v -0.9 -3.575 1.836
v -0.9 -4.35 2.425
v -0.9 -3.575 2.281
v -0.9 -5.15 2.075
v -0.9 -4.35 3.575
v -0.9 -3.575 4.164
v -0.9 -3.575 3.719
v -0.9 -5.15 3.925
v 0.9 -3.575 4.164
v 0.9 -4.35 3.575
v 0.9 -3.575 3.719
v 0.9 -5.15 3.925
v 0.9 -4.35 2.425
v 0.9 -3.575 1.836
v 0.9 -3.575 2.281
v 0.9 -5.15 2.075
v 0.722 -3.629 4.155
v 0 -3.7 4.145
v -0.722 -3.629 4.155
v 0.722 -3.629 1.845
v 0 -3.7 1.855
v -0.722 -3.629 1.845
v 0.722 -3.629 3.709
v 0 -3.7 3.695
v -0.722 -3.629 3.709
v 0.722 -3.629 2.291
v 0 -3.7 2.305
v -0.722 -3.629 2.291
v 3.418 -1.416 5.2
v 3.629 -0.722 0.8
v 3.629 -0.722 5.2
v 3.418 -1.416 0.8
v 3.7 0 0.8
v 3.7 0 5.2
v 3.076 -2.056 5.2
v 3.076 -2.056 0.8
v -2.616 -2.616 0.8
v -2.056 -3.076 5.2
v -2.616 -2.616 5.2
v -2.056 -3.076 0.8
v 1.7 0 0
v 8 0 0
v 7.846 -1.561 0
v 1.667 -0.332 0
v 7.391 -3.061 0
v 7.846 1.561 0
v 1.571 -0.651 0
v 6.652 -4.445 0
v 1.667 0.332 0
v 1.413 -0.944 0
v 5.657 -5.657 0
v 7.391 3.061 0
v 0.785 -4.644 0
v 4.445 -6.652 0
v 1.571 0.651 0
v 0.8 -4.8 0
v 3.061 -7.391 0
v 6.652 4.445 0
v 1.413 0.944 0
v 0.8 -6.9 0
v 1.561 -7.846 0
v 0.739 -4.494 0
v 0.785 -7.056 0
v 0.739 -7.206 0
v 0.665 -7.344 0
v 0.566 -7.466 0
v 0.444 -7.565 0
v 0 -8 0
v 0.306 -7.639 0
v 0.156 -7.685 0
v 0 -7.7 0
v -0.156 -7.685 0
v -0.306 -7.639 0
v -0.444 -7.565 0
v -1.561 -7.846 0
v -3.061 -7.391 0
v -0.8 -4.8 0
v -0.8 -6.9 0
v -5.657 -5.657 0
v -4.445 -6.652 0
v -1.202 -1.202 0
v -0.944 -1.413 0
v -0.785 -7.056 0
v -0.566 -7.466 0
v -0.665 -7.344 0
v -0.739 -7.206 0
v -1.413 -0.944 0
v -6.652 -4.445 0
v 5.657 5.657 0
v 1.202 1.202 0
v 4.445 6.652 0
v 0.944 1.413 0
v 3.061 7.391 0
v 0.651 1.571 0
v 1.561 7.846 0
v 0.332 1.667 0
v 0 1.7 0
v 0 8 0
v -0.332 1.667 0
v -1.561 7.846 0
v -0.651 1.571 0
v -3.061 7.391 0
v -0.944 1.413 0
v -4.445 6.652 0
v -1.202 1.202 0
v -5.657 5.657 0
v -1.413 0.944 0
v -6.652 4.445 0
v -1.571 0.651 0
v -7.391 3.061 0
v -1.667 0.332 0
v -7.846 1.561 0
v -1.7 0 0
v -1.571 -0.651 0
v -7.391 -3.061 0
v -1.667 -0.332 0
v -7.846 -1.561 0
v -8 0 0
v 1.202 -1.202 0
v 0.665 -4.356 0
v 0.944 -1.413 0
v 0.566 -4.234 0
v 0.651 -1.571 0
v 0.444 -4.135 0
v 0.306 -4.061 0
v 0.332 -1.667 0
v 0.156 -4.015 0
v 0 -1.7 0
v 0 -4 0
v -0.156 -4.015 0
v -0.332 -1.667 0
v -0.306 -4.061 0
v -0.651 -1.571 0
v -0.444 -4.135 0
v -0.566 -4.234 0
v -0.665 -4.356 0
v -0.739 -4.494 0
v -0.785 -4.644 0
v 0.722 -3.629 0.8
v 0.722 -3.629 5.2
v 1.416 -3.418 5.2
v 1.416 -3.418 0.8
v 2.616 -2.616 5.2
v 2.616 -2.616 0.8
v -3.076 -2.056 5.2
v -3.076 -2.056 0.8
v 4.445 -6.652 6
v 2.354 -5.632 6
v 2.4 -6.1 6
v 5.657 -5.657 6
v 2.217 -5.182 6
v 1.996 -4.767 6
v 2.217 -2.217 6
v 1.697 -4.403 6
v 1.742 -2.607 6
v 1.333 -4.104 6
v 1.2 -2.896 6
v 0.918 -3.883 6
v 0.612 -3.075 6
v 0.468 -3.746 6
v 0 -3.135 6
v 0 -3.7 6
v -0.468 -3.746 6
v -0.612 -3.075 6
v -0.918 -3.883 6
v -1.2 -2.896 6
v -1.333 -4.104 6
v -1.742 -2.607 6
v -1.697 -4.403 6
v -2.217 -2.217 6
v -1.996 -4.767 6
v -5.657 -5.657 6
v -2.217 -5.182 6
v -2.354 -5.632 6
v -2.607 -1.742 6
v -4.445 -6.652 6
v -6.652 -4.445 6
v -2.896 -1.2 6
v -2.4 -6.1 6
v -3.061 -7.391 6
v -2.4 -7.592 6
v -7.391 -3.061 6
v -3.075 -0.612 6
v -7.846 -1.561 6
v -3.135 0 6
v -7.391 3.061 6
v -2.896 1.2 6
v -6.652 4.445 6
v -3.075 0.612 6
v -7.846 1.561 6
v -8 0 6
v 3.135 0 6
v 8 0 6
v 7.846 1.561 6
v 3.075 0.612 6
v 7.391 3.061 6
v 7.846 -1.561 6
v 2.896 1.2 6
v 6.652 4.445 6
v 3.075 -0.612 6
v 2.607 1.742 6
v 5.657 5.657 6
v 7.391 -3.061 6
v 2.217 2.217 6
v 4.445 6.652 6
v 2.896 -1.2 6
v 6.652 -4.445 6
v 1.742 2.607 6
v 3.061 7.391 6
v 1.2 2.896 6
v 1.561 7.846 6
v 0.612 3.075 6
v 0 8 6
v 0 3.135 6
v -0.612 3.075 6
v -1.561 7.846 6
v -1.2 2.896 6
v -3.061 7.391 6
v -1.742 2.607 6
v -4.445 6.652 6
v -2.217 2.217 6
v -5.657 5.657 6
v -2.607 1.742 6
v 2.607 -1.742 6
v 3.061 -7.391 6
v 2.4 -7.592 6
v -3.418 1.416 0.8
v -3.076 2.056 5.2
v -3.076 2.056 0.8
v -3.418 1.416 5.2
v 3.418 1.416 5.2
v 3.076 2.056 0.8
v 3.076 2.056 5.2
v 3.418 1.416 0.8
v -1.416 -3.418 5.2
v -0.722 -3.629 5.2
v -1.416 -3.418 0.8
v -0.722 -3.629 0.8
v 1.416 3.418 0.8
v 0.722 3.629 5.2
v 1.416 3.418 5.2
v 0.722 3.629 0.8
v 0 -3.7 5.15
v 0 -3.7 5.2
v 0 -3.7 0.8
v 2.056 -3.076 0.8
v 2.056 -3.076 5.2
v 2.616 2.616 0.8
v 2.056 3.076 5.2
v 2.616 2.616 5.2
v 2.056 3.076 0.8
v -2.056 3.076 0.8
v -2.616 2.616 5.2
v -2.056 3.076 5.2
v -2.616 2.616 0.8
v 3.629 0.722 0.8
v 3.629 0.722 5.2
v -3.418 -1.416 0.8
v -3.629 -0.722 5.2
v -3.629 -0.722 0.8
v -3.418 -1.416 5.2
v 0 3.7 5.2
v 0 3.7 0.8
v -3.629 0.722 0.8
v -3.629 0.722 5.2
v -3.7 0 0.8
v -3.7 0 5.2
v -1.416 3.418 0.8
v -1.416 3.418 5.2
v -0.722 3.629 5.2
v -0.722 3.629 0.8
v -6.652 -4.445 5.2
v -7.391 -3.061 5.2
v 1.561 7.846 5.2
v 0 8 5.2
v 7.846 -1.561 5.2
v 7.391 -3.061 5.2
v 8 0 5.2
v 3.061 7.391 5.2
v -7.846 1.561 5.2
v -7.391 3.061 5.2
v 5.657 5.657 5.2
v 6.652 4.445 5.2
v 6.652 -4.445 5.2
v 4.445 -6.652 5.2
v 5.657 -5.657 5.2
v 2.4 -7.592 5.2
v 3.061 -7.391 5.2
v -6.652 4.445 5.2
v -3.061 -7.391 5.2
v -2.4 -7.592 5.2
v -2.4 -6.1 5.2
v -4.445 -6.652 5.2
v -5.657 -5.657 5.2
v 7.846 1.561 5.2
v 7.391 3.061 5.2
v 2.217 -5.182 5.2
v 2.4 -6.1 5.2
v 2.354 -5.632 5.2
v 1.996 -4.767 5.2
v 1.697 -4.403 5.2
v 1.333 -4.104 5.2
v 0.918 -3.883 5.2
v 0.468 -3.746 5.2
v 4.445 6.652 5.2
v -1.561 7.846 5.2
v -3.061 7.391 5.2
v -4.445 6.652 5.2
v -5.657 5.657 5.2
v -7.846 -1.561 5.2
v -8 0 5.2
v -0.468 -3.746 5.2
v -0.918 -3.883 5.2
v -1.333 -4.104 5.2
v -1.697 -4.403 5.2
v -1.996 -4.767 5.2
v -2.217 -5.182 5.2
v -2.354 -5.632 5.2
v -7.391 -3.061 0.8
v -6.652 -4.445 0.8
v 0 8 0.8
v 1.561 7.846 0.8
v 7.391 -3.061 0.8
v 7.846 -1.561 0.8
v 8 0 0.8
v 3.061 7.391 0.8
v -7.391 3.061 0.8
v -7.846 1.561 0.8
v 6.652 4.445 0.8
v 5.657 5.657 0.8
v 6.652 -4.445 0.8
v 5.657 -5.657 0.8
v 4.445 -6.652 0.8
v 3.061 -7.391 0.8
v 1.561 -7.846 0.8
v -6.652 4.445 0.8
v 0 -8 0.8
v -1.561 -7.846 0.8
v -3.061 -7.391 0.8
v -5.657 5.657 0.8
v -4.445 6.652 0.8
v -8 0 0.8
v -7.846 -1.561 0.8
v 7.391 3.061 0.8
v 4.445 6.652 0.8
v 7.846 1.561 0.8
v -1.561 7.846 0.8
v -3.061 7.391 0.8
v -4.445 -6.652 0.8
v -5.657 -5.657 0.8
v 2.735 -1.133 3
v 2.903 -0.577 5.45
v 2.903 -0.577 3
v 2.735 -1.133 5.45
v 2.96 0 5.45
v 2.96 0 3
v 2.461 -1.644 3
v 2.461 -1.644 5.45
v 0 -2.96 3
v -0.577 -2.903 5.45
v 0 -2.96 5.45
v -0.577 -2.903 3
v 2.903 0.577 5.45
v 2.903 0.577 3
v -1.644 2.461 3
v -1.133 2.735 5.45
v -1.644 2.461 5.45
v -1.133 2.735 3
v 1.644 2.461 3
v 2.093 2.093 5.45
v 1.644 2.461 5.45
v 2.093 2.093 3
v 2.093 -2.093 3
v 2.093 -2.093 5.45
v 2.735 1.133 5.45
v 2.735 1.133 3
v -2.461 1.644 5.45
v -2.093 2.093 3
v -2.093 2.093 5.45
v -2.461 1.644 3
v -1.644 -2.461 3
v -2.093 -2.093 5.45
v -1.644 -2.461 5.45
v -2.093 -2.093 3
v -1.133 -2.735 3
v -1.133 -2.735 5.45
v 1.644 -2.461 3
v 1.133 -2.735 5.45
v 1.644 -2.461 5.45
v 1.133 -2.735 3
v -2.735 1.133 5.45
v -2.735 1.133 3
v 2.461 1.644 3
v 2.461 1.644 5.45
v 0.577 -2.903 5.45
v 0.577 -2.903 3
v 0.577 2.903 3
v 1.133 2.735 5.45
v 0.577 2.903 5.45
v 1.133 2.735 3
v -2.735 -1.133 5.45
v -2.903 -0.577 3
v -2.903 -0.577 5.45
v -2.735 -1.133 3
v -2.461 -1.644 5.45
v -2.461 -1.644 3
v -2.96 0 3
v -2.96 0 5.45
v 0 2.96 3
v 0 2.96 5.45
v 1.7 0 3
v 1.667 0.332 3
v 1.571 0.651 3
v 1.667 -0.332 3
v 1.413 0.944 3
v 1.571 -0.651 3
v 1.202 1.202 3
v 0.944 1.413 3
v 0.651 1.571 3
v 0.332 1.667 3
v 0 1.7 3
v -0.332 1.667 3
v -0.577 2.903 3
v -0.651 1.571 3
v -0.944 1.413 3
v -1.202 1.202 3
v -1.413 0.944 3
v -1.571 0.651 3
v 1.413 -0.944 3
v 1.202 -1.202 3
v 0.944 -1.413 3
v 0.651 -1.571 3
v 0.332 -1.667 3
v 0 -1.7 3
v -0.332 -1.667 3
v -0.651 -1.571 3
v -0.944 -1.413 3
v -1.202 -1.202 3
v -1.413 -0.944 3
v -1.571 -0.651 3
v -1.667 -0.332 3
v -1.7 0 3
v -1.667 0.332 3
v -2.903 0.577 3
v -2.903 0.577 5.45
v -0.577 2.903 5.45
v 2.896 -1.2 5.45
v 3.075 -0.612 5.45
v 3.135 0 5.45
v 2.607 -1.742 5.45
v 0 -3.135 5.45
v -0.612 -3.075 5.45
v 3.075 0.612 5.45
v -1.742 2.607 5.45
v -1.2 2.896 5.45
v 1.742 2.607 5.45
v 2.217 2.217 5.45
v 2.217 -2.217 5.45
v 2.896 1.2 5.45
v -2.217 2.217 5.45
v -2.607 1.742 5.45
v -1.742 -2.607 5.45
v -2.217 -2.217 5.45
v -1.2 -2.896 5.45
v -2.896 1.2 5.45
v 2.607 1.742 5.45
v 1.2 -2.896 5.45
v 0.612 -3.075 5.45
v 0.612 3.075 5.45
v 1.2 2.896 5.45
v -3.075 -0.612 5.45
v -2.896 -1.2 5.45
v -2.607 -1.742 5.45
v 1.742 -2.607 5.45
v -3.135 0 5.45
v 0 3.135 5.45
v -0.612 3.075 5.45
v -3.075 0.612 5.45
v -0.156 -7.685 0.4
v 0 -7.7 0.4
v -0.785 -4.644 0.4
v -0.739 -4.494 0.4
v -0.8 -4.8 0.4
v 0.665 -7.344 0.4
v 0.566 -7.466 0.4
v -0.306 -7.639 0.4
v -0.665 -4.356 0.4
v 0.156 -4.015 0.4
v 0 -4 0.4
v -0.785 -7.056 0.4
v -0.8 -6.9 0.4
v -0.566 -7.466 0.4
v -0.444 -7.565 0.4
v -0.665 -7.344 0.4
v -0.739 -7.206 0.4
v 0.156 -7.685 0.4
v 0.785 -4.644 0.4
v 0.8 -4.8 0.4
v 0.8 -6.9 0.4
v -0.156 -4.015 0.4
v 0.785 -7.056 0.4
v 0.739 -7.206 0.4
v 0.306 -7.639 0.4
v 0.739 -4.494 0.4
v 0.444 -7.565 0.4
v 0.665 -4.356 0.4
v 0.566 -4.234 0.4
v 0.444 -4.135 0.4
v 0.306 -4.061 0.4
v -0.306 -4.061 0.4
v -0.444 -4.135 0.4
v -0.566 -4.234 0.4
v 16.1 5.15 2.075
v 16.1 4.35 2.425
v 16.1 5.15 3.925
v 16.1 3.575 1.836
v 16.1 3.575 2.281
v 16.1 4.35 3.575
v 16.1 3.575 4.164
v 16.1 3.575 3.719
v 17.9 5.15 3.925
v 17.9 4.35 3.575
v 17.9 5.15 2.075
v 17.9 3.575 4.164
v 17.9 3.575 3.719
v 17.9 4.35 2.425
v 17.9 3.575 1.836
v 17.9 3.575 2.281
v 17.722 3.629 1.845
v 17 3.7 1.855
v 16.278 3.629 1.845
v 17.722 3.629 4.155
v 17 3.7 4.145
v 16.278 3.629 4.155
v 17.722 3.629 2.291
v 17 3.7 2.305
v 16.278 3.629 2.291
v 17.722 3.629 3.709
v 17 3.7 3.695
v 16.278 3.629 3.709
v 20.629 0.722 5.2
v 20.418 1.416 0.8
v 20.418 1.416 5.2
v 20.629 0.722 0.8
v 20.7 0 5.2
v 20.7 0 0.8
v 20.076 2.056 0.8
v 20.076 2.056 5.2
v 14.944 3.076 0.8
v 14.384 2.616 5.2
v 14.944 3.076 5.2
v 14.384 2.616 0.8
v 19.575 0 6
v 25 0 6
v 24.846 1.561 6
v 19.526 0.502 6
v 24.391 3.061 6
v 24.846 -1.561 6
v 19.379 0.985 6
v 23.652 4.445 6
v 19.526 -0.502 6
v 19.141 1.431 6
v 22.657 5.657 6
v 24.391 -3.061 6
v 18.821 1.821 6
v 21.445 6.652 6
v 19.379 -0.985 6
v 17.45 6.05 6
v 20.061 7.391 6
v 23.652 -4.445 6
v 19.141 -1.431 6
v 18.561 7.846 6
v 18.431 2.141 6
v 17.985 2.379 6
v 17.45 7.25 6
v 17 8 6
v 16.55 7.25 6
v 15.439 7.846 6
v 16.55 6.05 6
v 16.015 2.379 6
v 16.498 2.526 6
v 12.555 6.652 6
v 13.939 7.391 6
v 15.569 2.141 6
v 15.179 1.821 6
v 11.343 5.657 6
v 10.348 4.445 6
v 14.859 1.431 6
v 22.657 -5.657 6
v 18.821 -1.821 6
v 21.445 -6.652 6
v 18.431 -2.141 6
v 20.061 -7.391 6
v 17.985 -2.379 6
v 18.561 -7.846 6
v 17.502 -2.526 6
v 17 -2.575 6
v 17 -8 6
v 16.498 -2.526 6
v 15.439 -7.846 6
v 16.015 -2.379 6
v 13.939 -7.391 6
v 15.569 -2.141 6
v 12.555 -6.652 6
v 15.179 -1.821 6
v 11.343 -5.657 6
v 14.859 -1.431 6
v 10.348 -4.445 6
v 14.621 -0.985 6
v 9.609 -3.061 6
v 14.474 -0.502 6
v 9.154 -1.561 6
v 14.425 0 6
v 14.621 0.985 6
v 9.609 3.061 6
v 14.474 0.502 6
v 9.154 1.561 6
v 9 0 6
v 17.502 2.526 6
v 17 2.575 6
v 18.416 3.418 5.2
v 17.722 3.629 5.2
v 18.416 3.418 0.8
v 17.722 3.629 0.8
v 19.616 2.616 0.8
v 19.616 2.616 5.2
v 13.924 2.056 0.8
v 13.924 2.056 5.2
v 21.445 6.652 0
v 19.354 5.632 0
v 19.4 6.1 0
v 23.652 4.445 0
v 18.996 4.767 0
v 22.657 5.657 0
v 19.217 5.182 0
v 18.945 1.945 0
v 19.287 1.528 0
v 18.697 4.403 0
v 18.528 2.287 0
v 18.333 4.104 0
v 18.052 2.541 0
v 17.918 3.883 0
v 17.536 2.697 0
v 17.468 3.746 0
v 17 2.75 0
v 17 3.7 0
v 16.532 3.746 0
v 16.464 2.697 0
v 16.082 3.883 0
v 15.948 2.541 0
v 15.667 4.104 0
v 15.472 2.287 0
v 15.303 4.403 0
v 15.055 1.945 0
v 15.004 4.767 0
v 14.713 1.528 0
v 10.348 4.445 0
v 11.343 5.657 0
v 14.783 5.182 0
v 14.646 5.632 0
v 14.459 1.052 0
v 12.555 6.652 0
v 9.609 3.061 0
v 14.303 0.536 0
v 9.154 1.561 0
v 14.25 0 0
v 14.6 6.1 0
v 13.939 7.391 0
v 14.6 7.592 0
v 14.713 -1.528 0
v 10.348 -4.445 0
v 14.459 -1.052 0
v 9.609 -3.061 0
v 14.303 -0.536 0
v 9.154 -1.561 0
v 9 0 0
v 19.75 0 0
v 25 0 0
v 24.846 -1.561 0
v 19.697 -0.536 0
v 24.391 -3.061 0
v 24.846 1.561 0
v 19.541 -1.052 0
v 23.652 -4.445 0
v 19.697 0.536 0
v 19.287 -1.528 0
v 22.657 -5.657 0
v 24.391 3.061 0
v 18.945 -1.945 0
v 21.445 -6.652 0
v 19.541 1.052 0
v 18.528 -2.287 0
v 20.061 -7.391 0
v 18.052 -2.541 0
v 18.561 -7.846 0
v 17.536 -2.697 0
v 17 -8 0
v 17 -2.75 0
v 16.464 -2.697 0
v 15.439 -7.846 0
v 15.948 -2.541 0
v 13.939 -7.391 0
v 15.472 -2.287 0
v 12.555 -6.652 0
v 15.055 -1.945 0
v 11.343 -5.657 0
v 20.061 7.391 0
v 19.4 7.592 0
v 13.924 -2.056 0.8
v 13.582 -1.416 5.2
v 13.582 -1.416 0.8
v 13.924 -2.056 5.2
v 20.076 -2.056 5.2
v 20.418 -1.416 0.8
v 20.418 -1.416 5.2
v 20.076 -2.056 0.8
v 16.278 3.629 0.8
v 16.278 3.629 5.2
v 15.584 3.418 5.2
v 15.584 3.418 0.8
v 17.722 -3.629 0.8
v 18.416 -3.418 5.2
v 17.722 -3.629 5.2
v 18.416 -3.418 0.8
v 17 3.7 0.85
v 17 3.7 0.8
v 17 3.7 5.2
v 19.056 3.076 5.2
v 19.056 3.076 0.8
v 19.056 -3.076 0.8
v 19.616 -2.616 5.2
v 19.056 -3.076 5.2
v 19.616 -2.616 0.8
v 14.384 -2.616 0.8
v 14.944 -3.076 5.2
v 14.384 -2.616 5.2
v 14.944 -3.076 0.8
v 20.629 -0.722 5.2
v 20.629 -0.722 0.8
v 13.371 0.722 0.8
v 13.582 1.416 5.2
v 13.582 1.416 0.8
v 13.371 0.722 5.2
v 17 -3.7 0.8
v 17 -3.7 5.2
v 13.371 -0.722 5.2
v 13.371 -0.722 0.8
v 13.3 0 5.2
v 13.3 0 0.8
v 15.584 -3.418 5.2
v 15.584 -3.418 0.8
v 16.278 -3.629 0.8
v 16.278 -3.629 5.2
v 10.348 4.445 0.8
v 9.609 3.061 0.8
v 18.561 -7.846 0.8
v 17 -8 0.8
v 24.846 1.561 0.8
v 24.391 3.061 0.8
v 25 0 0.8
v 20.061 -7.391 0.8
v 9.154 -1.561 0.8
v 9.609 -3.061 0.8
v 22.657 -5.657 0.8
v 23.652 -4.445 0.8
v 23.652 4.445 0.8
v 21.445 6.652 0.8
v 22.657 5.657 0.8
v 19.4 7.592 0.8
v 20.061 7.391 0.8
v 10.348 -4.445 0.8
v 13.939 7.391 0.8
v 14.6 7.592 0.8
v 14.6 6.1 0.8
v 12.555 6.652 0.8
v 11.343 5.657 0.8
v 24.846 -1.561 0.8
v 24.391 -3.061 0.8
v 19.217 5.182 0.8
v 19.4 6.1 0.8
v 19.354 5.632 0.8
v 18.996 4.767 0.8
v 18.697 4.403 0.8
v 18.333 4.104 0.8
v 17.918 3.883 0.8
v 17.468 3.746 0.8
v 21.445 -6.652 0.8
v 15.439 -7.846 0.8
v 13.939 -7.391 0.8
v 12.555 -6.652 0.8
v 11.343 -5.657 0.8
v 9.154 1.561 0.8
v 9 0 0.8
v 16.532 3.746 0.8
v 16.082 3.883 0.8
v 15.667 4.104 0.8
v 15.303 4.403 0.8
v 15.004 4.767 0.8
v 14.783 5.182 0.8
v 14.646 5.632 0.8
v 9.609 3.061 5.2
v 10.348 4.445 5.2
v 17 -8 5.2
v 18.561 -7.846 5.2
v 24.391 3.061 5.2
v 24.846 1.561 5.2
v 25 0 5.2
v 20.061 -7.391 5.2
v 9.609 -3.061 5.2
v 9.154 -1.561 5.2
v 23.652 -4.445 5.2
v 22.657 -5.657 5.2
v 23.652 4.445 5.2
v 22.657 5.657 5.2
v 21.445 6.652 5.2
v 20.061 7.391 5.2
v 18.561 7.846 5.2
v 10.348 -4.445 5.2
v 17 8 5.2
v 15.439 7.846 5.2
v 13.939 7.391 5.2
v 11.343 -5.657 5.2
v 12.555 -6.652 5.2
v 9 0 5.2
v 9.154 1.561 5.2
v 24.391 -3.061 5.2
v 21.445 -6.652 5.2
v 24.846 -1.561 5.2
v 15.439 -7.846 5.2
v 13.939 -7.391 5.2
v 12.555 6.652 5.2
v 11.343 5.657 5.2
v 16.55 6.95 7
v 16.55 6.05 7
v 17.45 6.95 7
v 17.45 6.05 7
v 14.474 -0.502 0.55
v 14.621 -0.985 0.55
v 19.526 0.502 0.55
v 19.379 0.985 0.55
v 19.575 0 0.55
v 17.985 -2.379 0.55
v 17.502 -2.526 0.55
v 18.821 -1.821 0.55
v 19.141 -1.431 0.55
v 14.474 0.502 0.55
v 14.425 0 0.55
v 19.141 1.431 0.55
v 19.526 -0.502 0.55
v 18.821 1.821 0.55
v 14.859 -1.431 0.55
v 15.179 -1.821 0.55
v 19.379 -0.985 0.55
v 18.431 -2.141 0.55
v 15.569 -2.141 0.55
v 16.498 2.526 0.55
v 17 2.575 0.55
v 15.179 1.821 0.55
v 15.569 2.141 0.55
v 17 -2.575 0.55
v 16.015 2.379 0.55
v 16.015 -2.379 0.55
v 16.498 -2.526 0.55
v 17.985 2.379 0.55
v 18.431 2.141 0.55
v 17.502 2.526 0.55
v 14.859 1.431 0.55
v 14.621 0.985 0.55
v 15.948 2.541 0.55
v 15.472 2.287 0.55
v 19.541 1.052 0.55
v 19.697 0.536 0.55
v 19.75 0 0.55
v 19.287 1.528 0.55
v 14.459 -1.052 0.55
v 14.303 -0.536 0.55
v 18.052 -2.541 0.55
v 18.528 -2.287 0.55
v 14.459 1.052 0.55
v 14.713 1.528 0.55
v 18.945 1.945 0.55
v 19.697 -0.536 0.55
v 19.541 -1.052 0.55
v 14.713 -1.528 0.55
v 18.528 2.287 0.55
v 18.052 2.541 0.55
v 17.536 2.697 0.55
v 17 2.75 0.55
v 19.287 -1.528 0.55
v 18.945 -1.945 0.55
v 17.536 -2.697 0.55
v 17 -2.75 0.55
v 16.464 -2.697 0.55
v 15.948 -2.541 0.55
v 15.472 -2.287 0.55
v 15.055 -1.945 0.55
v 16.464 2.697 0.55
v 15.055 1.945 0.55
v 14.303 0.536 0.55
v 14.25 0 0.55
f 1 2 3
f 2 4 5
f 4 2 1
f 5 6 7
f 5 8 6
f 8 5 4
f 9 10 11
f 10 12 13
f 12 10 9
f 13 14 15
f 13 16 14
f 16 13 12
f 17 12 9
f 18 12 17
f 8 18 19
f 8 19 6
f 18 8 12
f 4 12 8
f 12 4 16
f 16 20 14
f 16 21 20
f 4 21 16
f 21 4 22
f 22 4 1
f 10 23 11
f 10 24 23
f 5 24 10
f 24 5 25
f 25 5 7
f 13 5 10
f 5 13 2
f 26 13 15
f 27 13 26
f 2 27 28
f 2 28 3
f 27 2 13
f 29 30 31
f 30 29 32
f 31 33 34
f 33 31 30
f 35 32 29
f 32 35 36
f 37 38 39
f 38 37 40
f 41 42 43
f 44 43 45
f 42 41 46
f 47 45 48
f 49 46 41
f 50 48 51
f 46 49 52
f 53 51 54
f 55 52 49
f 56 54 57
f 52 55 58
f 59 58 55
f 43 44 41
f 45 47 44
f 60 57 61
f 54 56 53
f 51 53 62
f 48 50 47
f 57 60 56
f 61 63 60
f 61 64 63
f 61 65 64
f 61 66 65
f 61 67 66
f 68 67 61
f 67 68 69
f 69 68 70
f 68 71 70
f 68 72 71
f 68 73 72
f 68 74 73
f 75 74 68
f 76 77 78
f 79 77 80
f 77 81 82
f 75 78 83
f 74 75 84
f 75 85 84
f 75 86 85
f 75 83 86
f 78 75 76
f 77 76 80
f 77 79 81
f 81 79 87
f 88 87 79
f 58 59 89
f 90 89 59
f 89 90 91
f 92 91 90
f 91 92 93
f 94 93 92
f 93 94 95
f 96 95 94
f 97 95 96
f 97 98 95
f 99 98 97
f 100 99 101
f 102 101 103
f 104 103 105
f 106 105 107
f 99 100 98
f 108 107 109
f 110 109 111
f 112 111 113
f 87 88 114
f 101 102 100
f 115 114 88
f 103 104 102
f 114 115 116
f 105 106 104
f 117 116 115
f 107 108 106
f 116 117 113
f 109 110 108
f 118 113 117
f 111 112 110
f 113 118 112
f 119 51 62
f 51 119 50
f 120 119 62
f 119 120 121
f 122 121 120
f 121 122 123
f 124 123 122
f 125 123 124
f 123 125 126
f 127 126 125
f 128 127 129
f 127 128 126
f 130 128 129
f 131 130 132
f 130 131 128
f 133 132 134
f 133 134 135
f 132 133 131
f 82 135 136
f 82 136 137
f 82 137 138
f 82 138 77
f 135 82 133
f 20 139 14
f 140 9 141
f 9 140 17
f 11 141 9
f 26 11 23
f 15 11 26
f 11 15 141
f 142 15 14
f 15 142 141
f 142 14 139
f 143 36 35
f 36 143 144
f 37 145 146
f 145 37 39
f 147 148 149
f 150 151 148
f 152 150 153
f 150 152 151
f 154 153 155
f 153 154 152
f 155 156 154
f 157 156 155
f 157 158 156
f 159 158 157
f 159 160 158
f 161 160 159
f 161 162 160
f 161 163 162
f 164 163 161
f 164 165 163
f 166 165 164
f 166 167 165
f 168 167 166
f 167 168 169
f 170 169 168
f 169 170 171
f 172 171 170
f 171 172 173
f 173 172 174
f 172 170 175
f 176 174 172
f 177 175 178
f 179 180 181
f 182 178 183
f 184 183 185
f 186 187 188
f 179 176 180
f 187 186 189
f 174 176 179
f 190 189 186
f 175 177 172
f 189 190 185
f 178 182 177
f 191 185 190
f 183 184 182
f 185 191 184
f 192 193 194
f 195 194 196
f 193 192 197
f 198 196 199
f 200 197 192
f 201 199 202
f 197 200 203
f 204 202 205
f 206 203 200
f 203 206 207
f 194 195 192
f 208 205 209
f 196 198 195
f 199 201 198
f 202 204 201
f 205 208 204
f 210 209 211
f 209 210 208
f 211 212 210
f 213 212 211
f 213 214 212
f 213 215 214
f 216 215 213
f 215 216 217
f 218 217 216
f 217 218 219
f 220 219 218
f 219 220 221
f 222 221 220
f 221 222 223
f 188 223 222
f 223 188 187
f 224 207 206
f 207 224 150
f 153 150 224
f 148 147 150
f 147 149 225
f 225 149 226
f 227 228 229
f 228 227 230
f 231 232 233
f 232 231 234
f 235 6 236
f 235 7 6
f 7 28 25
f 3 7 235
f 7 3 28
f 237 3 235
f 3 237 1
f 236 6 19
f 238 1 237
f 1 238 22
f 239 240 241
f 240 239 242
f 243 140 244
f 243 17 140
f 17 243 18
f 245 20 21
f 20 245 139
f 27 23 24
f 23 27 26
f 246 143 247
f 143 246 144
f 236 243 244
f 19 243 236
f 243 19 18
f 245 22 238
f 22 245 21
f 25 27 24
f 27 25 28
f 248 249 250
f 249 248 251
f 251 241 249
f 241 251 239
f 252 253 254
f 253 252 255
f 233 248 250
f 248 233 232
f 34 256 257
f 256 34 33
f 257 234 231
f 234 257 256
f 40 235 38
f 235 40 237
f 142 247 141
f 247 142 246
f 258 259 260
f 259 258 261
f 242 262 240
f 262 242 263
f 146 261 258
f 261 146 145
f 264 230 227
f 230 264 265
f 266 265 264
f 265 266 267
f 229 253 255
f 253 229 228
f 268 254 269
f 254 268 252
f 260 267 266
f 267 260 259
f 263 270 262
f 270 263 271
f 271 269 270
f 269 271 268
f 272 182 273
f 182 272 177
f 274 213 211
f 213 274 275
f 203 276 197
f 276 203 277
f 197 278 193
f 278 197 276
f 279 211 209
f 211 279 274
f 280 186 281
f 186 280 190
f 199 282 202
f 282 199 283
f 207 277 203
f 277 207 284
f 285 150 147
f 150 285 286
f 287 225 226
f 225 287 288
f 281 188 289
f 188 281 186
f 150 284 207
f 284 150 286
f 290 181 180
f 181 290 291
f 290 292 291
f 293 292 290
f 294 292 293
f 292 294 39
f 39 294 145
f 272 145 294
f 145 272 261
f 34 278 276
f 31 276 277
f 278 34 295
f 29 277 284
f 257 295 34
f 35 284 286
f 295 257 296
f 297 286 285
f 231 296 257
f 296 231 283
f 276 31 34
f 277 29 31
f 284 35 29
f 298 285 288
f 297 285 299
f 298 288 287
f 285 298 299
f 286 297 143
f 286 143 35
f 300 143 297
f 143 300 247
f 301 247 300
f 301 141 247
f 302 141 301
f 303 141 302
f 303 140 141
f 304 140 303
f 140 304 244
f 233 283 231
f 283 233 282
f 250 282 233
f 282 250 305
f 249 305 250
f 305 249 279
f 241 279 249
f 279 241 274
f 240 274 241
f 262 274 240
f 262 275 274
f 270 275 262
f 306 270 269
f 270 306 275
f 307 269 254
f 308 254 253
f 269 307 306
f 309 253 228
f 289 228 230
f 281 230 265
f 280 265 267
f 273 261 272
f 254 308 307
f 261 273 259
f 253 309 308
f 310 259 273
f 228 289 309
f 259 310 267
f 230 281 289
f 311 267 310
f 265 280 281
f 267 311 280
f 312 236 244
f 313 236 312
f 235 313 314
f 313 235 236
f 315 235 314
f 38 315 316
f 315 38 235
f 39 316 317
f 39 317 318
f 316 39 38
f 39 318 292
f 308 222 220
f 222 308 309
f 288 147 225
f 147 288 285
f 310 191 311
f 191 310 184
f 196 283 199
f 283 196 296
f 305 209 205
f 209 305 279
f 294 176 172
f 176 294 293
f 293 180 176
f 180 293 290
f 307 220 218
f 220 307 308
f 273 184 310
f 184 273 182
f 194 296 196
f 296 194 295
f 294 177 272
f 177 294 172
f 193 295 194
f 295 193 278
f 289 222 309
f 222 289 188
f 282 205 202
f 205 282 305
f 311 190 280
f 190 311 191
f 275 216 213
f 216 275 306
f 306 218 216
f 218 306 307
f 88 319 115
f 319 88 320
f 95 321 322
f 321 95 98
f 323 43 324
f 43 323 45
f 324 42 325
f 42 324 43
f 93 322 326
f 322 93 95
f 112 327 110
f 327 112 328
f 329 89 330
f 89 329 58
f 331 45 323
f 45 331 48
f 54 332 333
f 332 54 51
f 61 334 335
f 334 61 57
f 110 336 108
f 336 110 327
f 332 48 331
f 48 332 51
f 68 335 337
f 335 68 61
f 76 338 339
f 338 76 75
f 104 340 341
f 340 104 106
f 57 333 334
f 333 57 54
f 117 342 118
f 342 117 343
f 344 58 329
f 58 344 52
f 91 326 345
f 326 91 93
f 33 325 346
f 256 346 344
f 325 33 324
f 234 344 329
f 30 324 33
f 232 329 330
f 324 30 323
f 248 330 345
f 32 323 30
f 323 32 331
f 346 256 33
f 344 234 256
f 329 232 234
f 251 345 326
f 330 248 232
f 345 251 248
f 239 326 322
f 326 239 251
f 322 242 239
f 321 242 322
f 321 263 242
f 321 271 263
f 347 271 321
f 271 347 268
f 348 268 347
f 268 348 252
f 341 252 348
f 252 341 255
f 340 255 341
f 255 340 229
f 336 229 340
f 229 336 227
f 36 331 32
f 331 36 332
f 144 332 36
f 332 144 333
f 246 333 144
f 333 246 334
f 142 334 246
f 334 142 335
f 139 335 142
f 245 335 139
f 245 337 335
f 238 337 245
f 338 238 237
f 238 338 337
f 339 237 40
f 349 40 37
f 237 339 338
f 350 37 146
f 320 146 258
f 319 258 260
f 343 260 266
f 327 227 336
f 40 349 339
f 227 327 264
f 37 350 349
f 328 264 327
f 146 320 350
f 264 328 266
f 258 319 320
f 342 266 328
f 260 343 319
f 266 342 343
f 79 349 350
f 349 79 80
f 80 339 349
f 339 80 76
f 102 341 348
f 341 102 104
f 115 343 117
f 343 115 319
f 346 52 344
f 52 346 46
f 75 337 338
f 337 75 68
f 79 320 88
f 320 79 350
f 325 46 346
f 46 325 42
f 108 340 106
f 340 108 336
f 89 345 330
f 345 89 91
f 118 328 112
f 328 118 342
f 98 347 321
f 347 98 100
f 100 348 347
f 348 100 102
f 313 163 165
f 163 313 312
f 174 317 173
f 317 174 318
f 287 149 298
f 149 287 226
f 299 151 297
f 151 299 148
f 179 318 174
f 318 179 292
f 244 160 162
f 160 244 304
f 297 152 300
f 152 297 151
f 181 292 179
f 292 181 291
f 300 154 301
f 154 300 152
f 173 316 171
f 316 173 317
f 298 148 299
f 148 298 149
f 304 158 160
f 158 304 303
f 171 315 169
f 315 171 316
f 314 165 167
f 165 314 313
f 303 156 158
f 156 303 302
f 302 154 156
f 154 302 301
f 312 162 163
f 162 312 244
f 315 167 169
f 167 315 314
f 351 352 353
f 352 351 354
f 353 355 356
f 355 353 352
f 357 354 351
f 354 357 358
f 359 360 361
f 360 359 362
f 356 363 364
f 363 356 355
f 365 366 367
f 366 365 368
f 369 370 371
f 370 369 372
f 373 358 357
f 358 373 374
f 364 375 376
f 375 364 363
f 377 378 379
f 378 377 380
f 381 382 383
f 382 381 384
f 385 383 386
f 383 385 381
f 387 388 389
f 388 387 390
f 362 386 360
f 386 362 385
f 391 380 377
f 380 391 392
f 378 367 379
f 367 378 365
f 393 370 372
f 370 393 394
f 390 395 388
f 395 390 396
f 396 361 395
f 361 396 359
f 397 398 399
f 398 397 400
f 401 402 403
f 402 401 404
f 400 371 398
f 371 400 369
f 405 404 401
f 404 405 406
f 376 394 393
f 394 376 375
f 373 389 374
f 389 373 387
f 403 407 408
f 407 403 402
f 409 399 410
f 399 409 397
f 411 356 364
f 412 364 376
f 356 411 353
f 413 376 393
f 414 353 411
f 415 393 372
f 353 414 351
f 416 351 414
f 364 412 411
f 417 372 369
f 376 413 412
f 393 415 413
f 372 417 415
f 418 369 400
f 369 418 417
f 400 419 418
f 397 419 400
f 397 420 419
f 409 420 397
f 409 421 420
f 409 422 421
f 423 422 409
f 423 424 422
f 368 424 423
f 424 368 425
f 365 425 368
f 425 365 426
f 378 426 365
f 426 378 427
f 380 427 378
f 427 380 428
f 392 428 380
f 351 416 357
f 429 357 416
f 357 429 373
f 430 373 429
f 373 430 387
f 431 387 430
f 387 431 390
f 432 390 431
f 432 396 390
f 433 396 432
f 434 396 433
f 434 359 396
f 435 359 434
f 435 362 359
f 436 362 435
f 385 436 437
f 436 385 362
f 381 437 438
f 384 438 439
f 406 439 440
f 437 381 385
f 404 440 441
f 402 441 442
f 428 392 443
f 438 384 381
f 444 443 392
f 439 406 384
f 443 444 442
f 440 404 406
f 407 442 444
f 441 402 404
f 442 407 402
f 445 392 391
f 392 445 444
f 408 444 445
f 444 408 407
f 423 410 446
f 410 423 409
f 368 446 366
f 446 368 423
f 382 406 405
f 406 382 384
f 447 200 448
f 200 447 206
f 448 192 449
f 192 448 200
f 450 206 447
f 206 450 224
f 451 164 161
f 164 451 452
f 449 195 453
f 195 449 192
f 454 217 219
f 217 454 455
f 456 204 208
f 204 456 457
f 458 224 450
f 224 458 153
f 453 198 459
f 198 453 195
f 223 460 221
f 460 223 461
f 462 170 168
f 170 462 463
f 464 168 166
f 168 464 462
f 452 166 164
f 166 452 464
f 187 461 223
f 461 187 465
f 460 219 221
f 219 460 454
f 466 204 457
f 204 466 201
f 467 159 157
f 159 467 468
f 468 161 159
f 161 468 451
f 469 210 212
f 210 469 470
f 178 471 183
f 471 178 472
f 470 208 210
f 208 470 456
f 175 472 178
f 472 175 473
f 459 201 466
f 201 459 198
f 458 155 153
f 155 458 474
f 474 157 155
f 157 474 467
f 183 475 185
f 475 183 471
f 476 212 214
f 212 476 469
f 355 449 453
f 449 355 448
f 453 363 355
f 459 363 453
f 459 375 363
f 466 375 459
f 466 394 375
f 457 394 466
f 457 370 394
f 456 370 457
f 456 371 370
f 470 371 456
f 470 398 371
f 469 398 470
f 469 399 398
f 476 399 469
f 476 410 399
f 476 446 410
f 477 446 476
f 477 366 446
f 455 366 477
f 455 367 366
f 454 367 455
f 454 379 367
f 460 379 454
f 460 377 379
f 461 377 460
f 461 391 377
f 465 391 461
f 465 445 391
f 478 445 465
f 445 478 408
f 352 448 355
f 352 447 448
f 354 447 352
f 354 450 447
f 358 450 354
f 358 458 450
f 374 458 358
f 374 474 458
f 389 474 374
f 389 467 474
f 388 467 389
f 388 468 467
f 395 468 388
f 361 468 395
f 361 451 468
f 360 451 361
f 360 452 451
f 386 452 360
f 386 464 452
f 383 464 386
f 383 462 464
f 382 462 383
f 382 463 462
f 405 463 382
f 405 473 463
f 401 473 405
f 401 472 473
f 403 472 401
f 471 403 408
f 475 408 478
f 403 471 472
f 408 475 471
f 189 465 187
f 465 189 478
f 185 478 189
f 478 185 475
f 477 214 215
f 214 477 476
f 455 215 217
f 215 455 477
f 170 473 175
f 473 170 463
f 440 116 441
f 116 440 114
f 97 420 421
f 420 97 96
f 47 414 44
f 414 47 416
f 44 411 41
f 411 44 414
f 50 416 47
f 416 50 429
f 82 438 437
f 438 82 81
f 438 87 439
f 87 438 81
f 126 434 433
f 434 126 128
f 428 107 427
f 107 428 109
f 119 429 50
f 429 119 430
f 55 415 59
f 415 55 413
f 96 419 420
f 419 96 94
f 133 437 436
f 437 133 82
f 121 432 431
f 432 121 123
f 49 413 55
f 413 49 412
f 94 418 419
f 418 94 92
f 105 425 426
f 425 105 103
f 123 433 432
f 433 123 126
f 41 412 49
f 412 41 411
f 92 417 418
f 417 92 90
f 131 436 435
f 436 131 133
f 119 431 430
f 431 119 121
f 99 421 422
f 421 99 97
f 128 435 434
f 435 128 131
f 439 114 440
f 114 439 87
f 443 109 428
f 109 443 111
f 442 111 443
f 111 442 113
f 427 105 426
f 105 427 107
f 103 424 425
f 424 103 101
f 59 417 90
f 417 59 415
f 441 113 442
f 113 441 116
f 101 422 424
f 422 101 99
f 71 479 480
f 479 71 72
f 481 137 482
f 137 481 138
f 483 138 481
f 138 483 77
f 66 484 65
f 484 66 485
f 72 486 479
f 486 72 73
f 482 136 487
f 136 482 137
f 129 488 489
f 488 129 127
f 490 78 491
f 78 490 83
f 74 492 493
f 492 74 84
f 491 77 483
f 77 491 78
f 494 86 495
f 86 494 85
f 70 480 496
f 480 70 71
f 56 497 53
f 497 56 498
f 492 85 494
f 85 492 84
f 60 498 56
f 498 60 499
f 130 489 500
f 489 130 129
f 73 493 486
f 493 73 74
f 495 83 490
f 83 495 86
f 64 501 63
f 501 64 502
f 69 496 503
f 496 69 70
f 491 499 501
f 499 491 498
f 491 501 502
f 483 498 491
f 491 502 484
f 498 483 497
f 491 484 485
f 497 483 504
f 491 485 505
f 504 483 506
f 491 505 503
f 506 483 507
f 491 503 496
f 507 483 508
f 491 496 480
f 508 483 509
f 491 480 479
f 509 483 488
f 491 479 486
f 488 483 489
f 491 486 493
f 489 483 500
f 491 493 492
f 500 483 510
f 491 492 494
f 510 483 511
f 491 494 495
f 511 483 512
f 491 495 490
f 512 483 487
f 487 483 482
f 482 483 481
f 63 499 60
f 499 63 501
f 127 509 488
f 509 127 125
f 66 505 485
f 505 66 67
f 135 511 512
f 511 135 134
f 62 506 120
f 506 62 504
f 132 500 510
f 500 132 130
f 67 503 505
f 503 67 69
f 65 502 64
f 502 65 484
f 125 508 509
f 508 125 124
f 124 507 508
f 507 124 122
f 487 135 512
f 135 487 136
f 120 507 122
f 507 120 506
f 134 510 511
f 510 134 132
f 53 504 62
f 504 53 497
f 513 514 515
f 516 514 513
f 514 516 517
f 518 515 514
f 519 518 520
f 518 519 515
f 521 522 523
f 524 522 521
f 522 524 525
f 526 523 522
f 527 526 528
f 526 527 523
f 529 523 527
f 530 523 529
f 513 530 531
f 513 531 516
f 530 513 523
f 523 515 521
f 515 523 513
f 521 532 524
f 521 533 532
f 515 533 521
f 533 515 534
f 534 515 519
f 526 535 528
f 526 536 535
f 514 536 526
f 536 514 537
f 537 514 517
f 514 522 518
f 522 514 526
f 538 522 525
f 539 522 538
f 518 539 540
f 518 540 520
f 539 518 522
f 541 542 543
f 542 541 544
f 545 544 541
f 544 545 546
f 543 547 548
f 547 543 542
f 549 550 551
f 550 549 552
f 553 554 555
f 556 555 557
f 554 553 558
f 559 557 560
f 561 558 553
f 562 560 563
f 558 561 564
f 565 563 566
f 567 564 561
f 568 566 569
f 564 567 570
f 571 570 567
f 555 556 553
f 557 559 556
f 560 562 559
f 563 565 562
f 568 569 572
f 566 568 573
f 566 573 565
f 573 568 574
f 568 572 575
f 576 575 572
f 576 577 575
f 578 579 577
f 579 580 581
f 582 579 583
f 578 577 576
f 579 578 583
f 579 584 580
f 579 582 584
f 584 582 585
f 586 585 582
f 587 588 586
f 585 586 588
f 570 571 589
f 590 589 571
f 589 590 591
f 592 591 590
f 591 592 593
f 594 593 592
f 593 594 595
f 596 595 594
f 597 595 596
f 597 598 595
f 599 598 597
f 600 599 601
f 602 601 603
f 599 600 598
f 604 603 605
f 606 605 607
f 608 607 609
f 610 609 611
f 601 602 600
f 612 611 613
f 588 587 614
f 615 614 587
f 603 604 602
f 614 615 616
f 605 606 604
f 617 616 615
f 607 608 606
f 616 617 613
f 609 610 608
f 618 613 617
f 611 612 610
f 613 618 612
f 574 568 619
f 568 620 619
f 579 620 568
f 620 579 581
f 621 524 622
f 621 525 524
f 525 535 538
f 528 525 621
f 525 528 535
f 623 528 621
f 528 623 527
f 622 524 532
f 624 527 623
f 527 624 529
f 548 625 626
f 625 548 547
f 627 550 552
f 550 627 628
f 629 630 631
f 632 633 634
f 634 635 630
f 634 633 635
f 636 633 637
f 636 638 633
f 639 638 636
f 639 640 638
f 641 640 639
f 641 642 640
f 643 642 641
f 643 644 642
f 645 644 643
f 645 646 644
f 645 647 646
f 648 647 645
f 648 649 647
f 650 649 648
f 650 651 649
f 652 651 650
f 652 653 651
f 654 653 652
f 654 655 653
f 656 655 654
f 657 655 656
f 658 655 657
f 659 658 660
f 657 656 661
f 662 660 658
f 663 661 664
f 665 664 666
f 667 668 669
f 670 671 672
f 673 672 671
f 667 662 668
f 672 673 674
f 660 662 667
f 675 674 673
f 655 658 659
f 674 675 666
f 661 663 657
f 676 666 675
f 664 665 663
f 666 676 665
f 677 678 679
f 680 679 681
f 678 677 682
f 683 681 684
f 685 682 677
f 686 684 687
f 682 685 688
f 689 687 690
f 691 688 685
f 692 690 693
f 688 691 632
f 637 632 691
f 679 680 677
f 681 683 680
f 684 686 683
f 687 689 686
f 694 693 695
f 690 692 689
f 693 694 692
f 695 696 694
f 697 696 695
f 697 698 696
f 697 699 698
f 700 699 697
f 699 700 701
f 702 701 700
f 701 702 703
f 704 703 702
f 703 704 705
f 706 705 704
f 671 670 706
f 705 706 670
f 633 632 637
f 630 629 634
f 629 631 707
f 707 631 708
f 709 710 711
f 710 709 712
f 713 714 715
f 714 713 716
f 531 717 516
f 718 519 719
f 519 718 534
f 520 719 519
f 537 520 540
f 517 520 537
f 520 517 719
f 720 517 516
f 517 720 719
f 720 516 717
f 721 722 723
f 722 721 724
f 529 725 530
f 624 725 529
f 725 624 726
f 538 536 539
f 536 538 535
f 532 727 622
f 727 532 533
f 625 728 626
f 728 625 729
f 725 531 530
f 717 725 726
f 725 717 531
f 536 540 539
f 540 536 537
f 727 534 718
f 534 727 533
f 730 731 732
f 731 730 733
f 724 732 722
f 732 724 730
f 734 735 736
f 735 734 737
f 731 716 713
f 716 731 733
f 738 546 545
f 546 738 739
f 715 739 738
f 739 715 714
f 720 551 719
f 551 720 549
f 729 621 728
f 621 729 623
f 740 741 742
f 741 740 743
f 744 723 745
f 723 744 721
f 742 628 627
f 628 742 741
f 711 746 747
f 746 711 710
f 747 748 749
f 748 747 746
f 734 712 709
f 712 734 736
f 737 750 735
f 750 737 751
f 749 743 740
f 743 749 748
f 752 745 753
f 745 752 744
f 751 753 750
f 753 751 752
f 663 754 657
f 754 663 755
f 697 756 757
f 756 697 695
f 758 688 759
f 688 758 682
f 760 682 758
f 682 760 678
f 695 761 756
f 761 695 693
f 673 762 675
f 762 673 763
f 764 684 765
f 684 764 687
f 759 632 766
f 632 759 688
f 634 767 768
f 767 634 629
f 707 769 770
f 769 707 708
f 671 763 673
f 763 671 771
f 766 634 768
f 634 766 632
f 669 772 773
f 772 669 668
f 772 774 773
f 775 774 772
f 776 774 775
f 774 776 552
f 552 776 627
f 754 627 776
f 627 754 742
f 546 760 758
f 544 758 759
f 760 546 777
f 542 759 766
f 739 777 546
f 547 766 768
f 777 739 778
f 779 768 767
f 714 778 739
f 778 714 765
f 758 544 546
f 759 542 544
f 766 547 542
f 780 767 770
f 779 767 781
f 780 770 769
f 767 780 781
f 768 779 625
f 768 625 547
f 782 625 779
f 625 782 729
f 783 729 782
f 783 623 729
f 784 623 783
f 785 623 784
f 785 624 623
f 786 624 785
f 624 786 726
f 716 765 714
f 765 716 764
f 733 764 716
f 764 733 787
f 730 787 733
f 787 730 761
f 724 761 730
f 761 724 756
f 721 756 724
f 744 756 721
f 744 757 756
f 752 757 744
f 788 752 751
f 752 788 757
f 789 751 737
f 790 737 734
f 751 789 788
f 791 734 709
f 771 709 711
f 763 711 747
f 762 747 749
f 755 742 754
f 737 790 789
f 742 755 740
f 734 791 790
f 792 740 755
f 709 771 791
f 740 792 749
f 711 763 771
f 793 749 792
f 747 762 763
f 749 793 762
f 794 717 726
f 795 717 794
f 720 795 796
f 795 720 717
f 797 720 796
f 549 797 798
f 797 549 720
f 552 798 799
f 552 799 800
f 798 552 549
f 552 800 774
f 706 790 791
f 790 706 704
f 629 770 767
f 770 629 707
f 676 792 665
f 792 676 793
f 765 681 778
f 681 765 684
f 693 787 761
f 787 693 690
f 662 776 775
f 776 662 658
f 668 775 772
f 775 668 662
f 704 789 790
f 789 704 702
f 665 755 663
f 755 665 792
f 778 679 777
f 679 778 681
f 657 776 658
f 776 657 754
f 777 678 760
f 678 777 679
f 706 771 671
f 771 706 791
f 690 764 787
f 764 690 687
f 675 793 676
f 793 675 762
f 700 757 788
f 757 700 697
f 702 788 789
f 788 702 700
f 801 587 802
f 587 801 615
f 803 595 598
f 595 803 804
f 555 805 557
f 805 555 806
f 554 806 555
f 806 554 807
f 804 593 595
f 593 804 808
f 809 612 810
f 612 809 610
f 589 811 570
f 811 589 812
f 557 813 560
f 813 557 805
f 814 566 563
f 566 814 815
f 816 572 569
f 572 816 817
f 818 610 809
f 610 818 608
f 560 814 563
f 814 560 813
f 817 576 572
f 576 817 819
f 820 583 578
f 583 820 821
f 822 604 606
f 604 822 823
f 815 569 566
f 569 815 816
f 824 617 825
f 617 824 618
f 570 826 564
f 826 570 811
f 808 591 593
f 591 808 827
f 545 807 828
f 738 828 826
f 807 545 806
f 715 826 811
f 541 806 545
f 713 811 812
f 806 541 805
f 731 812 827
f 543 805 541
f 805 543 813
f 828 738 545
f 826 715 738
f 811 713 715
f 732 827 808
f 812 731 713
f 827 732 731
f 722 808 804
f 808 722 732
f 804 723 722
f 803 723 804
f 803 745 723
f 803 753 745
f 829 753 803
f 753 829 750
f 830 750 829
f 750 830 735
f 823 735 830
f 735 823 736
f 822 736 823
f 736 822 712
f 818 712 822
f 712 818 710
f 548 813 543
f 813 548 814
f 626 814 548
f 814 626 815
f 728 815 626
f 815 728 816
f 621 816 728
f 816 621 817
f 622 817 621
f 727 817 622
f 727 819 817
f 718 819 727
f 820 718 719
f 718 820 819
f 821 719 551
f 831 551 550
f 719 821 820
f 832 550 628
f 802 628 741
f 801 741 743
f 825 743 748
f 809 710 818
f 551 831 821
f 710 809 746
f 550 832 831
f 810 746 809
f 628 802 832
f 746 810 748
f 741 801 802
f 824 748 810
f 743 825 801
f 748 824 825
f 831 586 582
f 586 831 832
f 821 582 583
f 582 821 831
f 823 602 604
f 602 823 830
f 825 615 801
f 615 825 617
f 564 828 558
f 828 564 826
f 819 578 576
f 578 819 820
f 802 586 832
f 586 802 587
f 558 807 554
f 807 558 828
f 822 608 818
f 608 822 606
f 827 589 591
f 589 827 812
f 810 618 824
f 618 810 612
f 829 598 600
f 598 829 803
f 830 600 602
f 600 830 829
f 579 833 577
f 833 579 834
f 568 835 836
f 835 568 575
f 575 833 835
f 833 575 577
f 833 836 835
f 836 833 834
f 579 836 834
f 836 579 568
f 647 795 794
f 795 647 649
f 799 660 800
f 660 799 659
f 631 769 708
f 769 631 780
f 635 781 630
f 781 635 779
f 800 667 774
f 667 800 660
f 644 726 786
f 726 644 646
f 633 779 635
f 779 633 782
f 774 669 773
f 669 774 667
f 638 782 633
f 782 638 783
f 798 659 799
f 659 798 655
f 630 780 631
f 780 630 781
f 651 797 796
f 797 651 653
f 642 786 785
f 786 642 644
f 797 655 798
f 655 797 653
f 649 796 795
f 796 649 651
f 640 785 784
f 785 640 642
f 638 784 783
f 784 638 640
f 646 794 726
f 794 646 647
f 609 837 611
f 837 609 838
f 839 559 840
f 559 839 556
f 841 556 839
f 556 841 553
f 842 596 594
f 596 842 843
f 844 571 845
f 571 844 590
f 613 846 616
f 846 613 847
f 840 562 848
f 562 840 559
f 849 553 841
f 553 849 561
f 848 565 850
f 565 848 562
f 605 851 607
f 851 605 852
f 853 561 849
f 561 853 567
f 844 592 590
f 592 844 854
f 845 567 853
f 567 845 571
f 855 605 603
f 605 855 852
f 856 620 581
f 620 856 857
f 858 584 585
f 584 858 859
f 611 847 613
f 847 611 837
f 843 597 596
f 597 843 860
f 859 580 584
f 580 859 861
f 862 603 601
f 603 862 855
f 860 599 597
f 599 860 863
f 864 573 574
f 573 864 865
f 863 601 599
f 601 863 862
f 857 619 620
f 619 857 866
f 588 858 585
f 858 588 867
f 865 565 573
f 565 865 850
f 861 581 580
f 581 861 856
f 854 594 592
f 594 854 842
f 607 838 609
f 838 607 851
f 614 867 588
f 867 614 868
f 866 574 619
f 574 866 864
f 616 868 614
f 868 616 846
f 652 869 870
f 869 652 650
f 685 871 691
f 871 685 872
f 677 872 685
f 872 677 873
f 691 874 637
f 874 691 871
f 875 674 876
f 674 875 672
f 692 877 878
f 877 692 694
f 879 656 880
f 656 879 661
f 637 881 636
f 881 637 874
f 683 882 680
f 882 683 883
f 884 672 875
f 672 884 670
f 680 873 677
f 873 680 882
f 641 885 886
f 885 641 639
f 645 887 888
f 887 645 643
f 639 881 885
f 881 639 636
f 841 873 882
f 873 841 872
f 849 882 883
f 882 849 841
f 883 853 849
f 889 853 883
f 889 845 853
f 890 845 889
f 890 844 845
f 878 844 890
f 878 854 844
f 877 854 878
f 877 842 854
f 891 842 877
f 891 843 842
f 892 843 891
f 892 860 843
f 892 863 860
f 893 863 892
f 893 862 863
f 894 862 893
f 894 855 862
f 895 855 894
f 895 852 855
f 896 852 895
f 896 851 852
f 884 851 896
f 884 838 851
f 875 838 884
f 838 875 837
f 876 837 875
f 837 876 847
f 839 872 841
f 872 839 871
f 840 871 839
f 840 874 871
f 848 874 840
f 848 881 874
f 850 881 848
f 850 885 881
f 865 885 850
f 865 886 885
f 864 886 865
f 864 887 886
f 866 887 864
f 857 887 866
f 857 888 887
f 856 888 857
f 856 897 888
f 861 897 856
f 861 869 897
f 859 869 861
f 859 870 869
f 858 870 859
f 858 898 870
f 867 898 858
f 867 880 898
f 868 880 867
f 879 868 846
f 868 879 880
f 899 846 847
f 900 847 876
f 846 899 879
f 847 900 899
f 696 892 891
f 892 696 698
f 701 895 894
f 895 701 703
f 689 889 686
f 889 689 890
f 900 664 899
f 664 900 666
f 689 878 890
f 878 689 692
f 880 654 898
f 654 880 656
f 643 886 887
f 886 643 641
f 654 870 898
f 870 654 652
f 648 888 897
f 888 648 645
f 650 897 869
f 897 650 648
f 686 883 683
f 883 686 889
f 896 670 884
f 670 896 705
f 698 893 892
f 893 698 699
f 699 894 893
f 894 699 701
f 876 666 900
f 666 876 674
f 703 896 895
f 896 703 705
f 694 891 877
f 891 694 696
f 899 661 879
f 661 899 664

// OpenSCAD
// DOUBLE TAKE FRAMES DESIGN RELEASE
// DTF_RELEASE: 2.0.0
// Released: 2026-08-31
// Versioning: Semantic Versioning 2.0.0 (https://semver.org/)
// Status: CANONICAL
// Changes in 2.0.0:
// - Uses captive 16 mm flanges coordinated with the revised clock-string guide.
// - Adds keyed bottom-flange loading slots and revised string anchors.
// Full release notes: https://doubletakeframes.com/build/#design-release
//
// Canonical captive-flange capstans.
//
// The capstans use 16 mm flanges. The hour horn is moved outward to suit that
// flange, and the upside-down minute capstan uses a recessed orientation mark.
// Canonical bores, drum geometry, heights, and the eyelet's 9 mm datum remain.

$fn = 32;
eps = 0.05;

// Selected fits retained from canonical. These modeled bores deliberately
// differ from the supplied movement-member ODs: 3.17 mm inner and 5.05 mm
// middle. They are fit dimensions, not transcriptions of movement specs.
minute_bore_d = is_undef(shared_minute_capstan_bore_d)
    ? 3.40 : shared_minute_capstan_bore_d;
hour_bores = [5.15];
minute_lower_clearance_d = 5.92;
minute_lower_clearance_h = 3.0; // Preserve canonical transition datum.

// Main geometry. The added height moves only the upper flange; established
// lower seating, anchor, and minute-bore-transition datums remain unchanged.
canonical_total_h = 5.0;
total_h = is_undef(shared_capstan_total_h)
    ? 6.0 : shared_capstan_total_h;
flange_h = 0.80;
drum_d = 7.4; // Printed winding-drum OD; unrelated to movement sleeve specs.
flange_d = is_undef(shared_capstan_flange_d)
    ? 16.0 : shared_capstan_flange_d; // MOCKUP: canonical is 9.0
eyelet_reference_flange_d = 9.0; // Keep canonical eyelet outer position.
bore_mouth_extra = 0.35;
bore_mouth_h = 0.55;
part_spacing_x = flange_d+1;     // Preserve 1 mm between enlarged parts.

// Bottom-flange installation key. It shares the fixed beak/string-anchor
// radial datum (+Y) and cannot accept the beak when the capstan is upside down.
bottom_insertion_notch_enabled = is_undef(shared_bottom_insertion_notch_enabled)
    ? true : shared_bottom_insertion_notch_enabled;
bottom_insertion_notch_clearance_per_side =
    is_undef(shared_beak_notch_clearance_per_side)
        ? 0.40 : shared_beak_notch_clearance_per_side;
bottom_insertion_notch_w_x =
    (is_undef(shared_beak_tangential_w) ? 4.0 : shared_beak_tangential_w)
    + 2*bottom_insertion_notch_clearance_per_side;

// ---------- sacrificial print supports ----------

breakaway_supports_enabled = false;
breakaway_support_count = 6;
breakaway_post_radius = 7.3;
breakaway_body_d = 1.2;
breakaway_neck_d = 0.65;
breakaway_neck_h = 0.30;

// Existing external string anchor retained unchanged.
string_eyelet_enabled = true;
string_eyelet_flange_gap_z = 0.60;
string_eyelet_w_x = 1.8;
string_eyelet_drum_overlap_y = 0.20;
string_eyelet_beyond_flange_y = is_undef(shared_string_eyelet_beyond_flange_y)
    ? 0.65 : shared_string_eyelet_beyond_flange_y;
string_eyelet_inner_face_h_z = 2.35;
string_eyelet_outer_face_h_z = 1.85;
string_eyelet_wall_z = 0.35;
string_eyelet_outer_wall_y = 0.8;    // Retain canonical hook-tip strength.
string_eyelet_void_inset_y = 0.70;

// Hour indicator horn: canonical size shifted radially toward the 16 mm rim.
indicator_horn_enabled = true;
indicator_horn_inner_y = 6.05;
indicator_horn_outer_y = 7.25;
indicator_horn_w_x = 0.90;
indicator_horn_h_z = 1.00;
indicator_horn_taper_y = 0.30;

// Bed-facing rounded orientation mark for the upside-down minute capstan.
// It stays inside the retaining rim and does not cut through the 0.8 mm flange.
minute_mark_w_x = 1.6;
minute_mark_y0 = 4.8;
minute_mark_y1 = 6.9;
minute_mark_depth_z = 0.40;

module cyl(d, h, z=0) {
    translate([0, 0, z]) cylinder(d=d, h=h);
}

module prism_x(points_yz, w_x) {
    n = len(points_yz);
    polyhedron(
        points = concat(
            [for (p = points_yz) [-w_x/2, p[0], p[1]]],
            [for (p = points_yz) [ w_x/2, p[0], p[1]]]
        ),
        faces = concat(
            [[for (i = [n-1:-1:0]) i]],
            [[for (i = [0:n-1]) i+n]],
            [for (i = [0:n-1]) [i, (i+1)%n, ((i+1)%n)+n, i+n]]
        )
    );
}

module top_indicator_horn(enabled=indicator_horn_enabled) {
    if (enabled)
        prism_x(
            [
                [indicator_horn_inner_y, total_h],
                [indicator_horn_outer_y, total_h],
                [indicator_horn_outer_y-indicator_horn_taper_y, total_h+indicator_horn_h_z],
                [indicator_horn_inner_y, total_h+indicator_horn_h_z]
            ],
            indicator_horn_w_x
        );
}

function eyelet_channel_z0() = flange_h + string_eyelet_flange_gap_z;
function eyelet_channel_z1() = total_h - flange_h - string_eyelet_flange_gap_z;
function eyelet_mid_z() = total_h/2; // Recenter with beak in widened gap.
function eyelet_inner_y() = drum_d/2 - string_eyelet_drum_overlap_y;
function eyelet_outer_y() = eyelet_reference_flange_d/2 + string_eyelet_beyond_flange_y;
function eyelet_inner_z0() = eyelet_mid_z() - string_eyelet_inner_face_h_z/2;
function eyelet_inner_z1() = eyelet_mid_z() + string_eyelet_inner_face_h_z/2;
function eyelet_outer_z0() = eyelet_mid_z() - string_eyelet_outer_face_h_z/2;
function eyelet_outer_z1() = eyelet_mid_z() + string_eyelet_outer_face_h_z/2;
function eyelet_void_inner_y() = drum_d/2 - string_eyelet_void_inset_y;
function eyelet_void_outer_y() = eyelet_outer_y() - string_eyelet_outer_wall_y;
function eyelet_void_inner_z0() = eyelet_inner_z0() + string_eyelet_wall_z;
function eyelet_void_inner_z1() = eyelet_inner_z1() - string_eyelet_wall_z;
function eyelet_void_outer_z0() = eyelet_outer_z0() + string_eyelet_wall_z;
function eyelet_void_outer_z1() = eyelet_outer_z1() - string_eyelet_wall_z;

module flipped_trapezoid_eyelet_solid_body() {
    intersection() {
        prism_x(
            [
                [eyelet_inner_y(), eyelet_inner_z0()],
                [eyelet_outer_y(), eyelet_outer_z0()],
                [eyelet_outer_y(), eyelet_outer_z1()],
                [eyelet_inner_y(), eyelet_inner_z1()]
            ],
            string_eyelet_w_x
        );
        translate([0, 0, total_h/2])
            cube([flange_d+2, flange_d+2, eyelet_channel_z1()-eyelet_channel_z0()], center=true);
    }
}

module flipped_trapezoid_eyelet_inner_polygon_void() {
    prism_x(
        [
            [eyelet_void_inner_y(), eyelet_void_inner_z0()],
            [eyelet_void_outer_y(), eyelet_void_outer_z0()],
            [eyelet_void_outer_y(), eyelet_void_outer_z1()],
            [eyelet_void_inner_y(), eyelet_void_inner_z1()]
        ],
        string_eyelet_w_x + 2*eps
    );
}

module polygon_cut_flipped_trapezoid_eyelet() {
    difference() {
        flipped_trapezoid_eyelet_solid_body();
        flipped_trapezoid_eyelet_inner_polygon_void();
    }
}

module bottom_insertion_notch() {
    if (bottom_insertion_notch_enabled)
        translate([0, 0, -eps])
            linear_extrude(height=flange_h+2*eps)
                hull() {
                    // Rounded inner end is tangent to the drum: no drum cut.
                    translate([0, drum_d/2+bottom_insertion_notch_w_x/2])
                        circle(d=bottom_insertion_notch_w_x);
                    // Carry the slot completely through the outer flange rim.
                    translate([0, flange_d/2+bottom_insertion_notch_w_x/2])
                        circle(d=bottom_insertion_notch_w_x);
                }
}

module capstan_shell(with_indicator_horn=true) {
    difference() {
        union() {
            cyl(drum_d, total_h);
            cyl(flange_d, flange_h);
            cyl(flange_d, flange_h, total_h-flange_h);
            if (string_eyelet_enabled) polygon_cut_flipped_trapezoid_eyelet();
            top_indicator_horn(with_indicator_horn && indicator_horn_enabled);
        }
        bottom_insertion_notch();
    }
}

module minute_orientation_mark() {
    translate([0, 0, total_h-minute_mark_depth_z])
        linear_extrude(height=minute_mark_depth_z+eps)
            hull()
                for (mark_y = [minute_mark_y0, minute_mark_y1])
                    translate([0, mark_y])
                        circle(d=minute_mark_w_x);
}

module minute_capstan() {
    difference() {
        // Printed upside down; omit the horn so the lower cavity prints cleanly.
        capstan_shell(with_indicator_horn=false);
        translate([0, 0, -eps])
            cylinder(d=minute_lower_clearance_d,
                     h=minute_lower_clearance_h+eps);
        translate([0, 0, -eps])
            cylinder(d=minute_lower_clearance_d+bore_mouth_extra, h=bore_mouth_h+eps);
        translate([0, 0, minute_lower_clearance_h])
            cylinder(d=minute_bore_d,
                     h=total_h-minute_lower_clearance_h+eps);
        minute_orientation_mark();
    }
}

module hour_capstan(bore_d=5.15) {
    difference() {
        capstan_shell(with_indicator_horn=true);
        translate([0, 0, -eps])
            cylinder(d=bore_d, h=total_h+2*eps);
        translate([0, 0, -eps])
            cylinder(d=bore_d+bore_mouth_extra, h=bore_mouth_h+eps);
    }
}

module breakaway_post(angle) {
    post_xy = [
        breakaway_post_radius*cos(angle),
        breakaway_post_radius*sin(angle)
    ];
    lower_flange_z1 = flange_h;
    upper_flange_z0 = total_h-flange_h;
    body_z0 = lower_flange_z1+breakaway_neck_h;
    body_z1 = upper_flange_z0-breakaway_neck_h;

    // Bottom snip neck, short rigid body, and top snip neck. The body remains
    // at the accessible outer edge and never approaches the eyelet sweep.
    translate([post_xy[0], post_xy[1], lower_flange_z1-eps])
        cylinder(d=breakaway_neck_d, h=breakaway_neck_h+eps);
    translate([post_xy[0], post_xy[1], body_z0-eps])
        cylinder(d=breakaway_body_d, h=body_z1-body_z0+2*eps);
    translate([post_xy[0], post_xy[1], body_z1])
        cylinder(d=breakaway_neck_d, h=breakaway_neck_h+eps);
}

module breakaway_post_set() {
    if (breakaway_supports_enabled)
        for (i=[0:breakaway_support_count-1])
            breakaway_post(i*360/breakaway_support_count);
}

module minute_capstan_print_layout() {
    // Former horn face on the bed; the recessed marker becomes a bed imprint.
    translate([0, 0, total_h])
        rotate([180, 0, 0])
            minute_capstan();
    breakaway_post_set();
}

module hour_capstan_print_layout(bore_d=5.15) {
    hour_capstan(bore_d);
    breakaway_post_set();
}

// Render minute + hour, matching the canonical file's deliverable pattern.
minute_capstan_print_layout();
for (i=[0:len(hour_bores)-1])
    translate([(i+1)*part_spacing_x, 0, 0])
        hour_capstan_print_layout(hour_bores[i]);
